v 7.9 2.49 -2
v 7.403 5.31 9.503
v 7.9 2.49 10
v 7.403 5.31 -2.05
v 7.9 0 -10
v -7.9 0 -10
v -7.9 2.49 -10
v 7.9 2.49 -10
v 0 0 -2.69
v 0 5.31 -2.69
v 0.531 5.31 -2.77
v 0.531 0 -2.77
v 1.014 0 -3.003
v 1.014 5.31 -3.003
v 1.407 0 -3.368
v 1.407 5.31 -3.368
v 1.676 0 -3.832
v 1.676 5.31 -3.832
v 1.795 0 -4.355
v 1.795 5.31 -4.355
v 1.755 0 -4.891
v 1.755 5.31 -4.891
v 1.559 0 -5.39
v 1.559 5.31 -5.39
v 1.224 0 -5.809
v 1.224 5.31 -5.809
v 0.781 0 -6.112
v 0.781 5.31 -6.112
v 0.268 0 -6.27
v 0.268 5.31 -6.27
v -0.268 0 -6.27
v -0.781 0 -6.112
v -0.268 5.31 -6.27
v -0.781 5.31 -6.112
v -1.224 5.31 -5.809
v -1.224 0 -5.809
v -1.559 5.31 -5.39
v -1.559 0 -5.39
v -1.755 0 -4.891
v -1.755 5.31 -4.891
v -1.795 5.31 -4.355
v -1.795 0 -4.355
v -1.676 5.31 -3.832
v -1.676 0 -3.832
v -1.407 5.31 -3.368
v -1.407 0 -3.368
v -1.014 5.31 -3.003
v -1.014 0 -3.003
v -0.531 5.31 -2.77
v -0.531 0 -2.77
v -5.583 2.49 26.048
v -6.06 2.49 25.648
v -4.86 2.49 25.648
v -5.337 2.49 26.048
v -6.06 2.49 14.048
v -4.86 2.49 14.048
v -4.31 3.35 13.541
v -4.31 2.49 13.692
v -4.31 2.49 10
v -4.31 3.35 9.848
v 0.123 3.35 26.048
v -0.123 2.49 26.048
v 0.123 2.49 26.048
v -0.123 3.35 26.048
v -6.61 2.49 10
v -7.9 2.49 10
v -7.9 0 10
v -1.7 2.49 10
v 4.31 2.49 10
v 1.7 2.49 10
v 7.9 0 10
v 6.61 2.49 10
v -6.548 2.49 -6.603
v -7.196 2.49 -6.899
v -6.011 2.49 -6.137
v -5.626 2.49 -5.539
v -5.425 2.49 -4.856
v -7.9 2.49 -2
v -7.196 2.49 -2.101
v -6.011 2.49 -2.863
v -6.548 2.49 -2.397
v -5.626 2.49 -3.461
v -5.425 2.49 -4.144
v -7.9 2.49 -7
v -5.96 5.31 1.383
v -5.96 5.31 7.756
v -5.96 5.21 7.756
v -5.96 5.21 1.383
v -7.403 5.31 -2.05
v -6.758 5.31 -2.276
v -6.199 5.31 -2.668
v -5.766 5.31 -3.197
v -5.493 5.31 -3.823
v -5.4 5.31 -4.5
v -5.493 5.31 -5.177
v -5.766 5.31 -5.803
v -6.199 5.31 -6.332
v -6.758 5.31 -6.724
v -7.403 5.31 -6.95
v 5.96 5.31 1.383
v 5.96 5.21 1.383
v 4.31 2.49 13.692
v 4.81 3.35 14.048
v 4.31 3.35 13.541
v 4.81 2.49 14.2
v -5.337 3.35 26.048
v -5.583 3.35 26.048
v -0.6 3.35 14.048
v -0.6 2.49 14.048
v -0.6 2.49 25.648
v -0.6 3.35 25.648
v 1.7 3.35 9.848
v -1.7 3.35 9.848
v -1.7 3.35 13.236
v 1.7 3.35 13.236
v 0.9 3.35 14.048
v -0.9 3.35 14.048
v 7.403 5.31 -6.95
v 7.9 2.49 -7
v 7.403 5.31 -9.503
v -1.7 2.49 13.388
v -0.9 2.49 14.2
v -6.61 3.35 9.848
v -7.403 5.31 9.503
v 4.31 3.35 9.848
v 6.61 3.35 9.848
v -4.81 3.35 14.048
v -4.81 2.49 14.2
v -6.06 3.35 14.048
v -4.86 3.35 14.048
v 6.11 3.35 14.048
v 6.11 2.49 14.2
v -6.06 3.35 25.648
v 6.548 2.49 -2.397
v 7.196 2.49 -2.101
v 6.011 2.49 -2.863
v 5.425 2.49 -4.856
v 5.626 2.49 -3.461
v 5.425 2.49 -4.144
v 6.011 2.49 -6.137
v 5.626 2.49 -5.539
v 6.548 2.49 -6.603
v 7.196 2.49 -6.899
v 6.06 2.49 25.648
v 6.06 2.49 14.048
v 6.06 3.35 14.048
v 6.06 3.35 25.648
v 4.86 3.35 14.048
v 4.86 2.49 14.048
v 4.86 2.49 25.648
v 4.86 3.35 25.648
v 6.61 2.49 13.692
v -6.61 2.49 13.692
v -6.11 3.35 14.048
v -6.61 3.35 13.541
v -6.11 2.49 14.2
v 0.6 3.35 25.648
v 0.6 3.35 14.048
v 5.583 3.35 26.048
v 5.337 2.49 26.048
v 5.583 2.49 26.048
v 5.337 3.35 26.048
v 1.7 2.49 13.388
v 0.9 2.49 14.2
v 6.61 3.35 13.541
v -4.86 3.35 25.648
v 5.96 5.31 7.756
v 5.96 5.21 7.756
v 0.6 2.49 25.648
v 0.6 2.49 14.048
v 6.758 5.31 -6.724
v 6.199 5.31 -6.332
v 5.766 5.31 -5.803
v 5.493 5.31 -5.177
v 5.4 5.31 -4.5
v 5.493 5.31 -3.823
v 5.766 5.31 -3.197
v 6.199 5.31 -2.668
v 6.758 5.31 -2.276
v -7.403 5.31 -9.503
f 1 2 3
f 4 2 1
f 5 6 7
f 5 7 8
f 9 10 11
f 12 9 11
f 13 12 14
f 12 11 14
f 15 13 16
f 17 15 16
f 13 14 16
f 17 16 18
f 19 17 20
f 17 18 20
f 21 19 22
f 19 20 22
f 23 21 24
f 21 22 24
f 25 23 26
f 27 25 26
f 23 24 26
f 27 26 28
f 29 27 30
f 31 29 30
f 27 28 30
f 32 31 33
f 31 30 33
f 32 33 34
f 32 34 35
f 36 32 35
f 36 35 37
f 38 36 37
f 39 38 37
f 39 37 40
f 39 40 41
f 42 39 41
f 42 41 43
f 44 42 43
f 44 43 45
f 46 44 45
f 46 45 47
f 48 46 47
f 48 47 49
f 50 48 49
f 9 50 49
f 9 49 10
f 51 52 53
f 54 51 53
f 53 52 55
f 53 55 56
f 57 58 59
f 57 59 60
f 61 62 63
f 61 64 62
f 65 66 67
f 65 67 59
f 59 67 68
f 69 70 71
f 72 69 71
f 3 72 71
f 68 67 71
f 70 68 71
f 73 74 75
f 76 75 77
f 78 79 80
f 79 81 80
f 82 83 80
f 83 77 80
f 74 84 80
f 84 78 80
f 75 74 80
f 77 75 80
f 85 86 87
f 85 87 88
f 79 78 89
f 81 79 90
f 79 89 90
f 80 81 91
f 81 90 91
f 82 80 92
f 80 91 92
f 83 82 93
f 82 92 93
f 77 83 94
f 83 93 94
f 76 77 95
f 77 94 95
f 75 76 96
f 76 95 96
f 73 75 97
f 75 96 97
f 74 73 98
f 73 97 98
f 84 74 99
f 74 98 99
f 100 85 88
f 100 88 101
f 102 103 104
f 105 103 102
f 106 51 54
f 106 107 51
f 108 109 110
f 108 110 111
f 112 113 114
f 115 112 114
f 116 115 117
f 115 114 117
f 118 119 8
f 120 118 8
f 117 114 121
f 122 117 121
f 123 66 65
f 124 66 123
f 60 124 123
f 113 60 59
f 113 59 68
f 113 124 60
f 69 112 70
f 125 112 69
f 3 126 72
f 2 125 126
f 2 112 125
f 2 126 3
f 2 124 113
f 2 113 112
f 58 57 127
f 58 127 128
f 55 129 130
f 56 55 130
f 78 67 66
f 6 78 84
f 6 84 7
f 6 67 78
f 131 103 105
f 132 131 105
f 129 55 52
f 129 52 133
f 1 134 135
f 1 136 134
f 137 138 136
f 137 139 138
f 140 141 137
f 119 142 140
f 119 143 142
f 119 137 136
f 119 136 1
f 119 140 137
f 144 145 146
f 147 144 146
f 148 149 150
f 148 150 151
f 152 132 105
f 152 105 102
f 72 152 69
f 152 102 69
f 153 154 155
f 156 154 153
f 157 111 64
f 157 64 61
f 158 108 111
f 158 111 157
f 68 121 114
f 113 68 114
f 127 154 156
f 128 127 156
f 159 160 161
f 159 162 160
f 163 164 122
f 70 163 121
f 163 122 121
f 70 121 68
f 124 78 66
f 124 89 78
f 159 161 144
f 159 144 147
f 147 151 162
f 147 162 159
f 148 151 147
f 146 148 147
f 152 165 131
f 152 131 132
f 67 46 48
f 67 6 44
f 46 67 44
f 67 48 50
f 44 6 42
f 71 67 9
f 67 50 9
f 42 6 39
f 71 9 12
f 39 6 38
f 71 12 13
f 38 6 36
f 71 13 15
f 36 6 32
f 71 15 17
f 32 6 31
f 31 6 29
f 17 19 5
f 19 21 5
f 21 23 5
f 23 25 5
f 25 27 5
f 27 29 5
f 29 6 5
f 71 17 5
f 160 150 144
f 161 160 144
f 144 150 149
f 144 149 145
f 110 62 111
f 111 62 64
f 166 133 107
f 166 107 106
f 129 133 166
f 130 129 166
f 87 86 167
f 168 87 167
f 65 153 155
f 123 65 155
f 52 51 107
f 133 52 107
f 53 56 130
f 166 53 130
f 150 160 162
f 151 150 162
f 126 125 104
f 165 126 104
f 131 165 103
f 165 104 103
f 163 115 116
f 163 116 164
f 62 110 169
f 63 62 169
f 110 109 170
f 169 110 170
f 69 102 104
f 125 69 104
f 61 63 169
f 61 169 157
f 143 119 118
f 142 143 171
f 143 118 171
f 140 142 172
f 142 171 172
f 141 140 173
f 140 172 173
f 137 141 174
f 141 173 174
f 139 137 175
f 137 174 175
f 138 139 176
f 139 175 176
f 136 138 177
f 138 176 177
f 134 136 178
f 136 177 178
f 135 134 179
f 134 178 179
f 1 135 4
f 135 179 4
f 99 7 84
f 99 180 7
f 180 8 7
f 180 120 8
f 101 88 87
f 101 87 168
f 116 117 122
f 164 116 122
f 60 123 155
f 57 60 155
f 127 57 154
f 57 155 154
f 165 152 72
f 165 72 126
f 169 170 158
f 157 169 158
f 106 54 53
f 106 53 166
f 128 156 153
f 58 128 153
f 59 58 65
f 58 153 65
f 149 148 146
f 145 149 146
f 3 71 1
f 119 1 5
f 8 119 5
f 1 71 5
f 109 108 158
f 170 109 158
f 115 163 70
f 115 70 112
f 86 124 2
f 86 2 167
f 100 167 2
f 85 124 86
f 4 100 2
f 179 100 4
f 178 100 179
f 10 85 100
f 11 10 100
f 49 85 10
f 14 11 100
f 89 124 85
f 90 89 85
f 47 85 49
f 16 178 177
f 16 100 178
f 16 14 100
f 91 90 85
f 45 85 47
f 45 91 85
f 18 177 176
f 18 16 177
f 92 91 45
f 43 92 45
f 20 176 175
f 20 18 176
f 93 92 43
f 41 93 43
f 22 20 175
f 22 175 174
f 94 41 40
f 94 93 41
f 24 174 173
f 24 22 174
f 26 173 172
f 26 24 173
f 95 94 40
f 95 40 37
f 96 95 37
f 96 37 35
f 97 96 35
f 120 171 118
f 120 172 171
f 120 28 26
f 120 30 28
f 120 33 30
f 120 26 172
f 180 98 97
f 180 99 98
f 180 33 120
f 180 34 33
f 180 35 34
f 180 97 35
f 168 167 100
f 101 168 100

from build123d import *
from OCP.BRepFilletAPI import BRepFilletAPI_MakeChamfer

# Parameters (mm, degrees)
SKETCH1_W             = 15.8
SKETCH1_H             = 20
BOSS_EXTRUDE1_DEPTH   = 2.49
SKETCH2_W             = 15.8
SKETCH2_H             = 20
BOSS_EXTRUDE3_DEPTH   = 2.82
BOSS_EXTRUDE3_TAPER   = 10
BOSS_EXTRUDE4_START   = -1.7
BOSS_EXTRUDE4_DEPTH   = 3.4
BOSS_EXTRUDE4_START_2 = -6.61
BOSS_EXTRUDE4_2_DEPTH = 2.3
BOSS_EXTRUDE4_START_3 = 4.31
BOSS_EXTRUDE4_3_DEPTH = 2.3
BOSS_EXTRUDE6_START   = 14.04836
SKETCH5_W             = 1.2
SKETCH5_H             = 0.86
BOSS_EXTRUDE6_DEPTH   = 12
BOSS_EXTRUDE6_2_DEPTH = 12
BOSS_EXTRUDE6_3_DEPTH = 12
SKETCH6_R             = 1.8
CUT_EXTRUDE1_DEPTH    = 28.733069795
SKETCH7_R             = 2.5
CUT_EXTRUDE2_DEPTH    = 2.82
CHAMFER2_SIZE         = 0.5
CHAMFER3_SIZE         = 0.8
CHAMFER7_SIZE         = 0.4
CHAMFER7_SIZE2        = 0.476701437
CHAMFER8_SIZE         = 0.4
CHAMFER8_SIZE2        = 0.476701437
CHAMFER9_SIZE         = 0.4
CHAMFER9_SIZE2        = 0.476701437
SKETCH9_W             = 12.986336946
SKETCH9_H             = 15.440559179
CUT_EXTRUDE3_DEPTH    = 2.49
SKETCH10_W            = 12.986336946
SKETCH10_H            = 15.440559179
BOSS_EXTRUDE7_DEPTH   = 2.49
SKETCH13_R            = 1.8
CUT_EXTRUDE4_DEPTH    = 2.49
SKETCH14_W            = 11.919281888
SKETCH14_H            = 6.372610916
CUT_EXTRUDE5_DEPTH    = 0.1


# Read off the part's stored shape, not the designer's step: Boss-Extrude4
with BuildPart() as part:
    # Sketch1 → Boss-Extrude1 (new body)
    with BuildSketch(Plane(origin=(0, 0, 0), x_dir=(1, 0, 0), z_dir=(0, 1, 0))):
        Rectangle(SKETCH1_W, SKETCH1_H)
    extrude(amount=BOSS_EXTRUDE1_DEPTH)

    # Sketch2 → Boss-Extrude3 (add)
    with BuildSketch(Plane(origin=(0, 2.49, 0), x_dir=(1, 0, 0), z_dir=(0, 1, 0))):
        Rectangle(SKETCH2_W, SKETCH2_H)
    extrude(amount=BOSS_EXTRUDE3_DEPTH, taper=BOSS_EXTRUDE3_TAPER)

    # Boss-Extrude4 outline → Boss-Extrude4 (add)
    with BuildSketch(Plane.YZ.offset(BOSS_EXTRUDE4_START)):
        Polygon((2.49, 10), (3.35, 9.848358796), (3.35, 14.048358797), (2.49, 14.2), align=None)
    extrude(amount=BOSS_EXTRUDE4_DEPTH)

    # Boss-Extrude4 2 outline → Boss-Extrude4 2 (add)
    with BuildSketch(Plane.YZ.offset(BOSS_EXTRUDE4_START_2)):
        Polygon((2.49, 10), (3.35, 9.848358796), (3.35, 14.048358797), (2.49, 14.2), align=None)
    extrude(amount=BOSS_EXTRUDE4_2_DEPTH)

    # Boss-Extrude4 3 outline → Boss-Extrude4 3 (add)
    with BuildSketch(Plane.YZ.offset(BOSS_EXTRUDE4_START_3)):
        Polygon((2.49, 10), (3.35, 9.848358796), (3.35, 14.048358797), (2.49, 14.2), align=None)
    extrude(amount=BOSS_EXTRUDE4_3_DEPTH)

    # Sketch6 → Cut-Extrude1 (cut, through all)
    with BuildSketch(Plane(origin=(0, 5.31, 0), x_dir=(1, 0, 0), z_dir=(0, 1, 0))):
        with Locations(Location((0, 4.49, 0), (0, 0, 270))):
            Circle(SKETCH6_R)
    extrude(amount=-CUT_EXTRUDE1_DEPTH, mode=Mode.SUBTRACT)

    # Sketch7 → Cut-Extrude2 (cut)
    with BuildSketch(Plane(origin=(0, 5.31, 0), x_dir=(1, 0, 0), z_dir=(0, 1, 0))):
        with Locations((7.9, 4.5)):
            Circle(SKETCH7_R)
        with Locations((-7.9, 4.5)):
            Circle(SKETCH7_R)
    extrude(amount=-CUT_EXTRUDE2_DEPTH, mode=Mode.SUBTRACT)

    # Chamfer2
    chamfer2_edges = [part.edges().sort_by_distance(p)[0] for p in [
        (4.31, 2.92, 14.124179399),
        (6.61, 2.92, 14.124179399),
        (-4.31, 2.92, 14.124179399),
        (-6.61, 2.92, 14.124179399),
    ]]
    chamfer(chamfer2_edges, length=CHAMFER2_SIZE)

    # Chamfer3
    chamfer3_edges = [part.edges().sort_by_distance(p)[0] for p in [
        (1.7, 2.92, 14.124179399),
        (-1.7, 2.92, 14.124179399),
    ]]
    chamfer(chamfer3_edges, length=CHAMFER3_SIZE)

    # Sketch9 → Cut-Extrude3 (cut)
    with BuildSketch(Plane.XZ):
        with Locations((0, -0.672147613)):
            Rectangle(SKETCH9_W, SKETCH9_H)
    extrude(amount=-CUT_EXTRUDE3_DEPTH, mode=Mode.SUBTRACT)

    # Sketch10 → Boss-Extrude7 (add)
    with BuildSketch(Plane.XZ.offset(-2.49)):
        with Locations((0, -0.672147613)):
            Rectangle(SKETCH10_W, SKETCH10_H)
    extrude(amount=BOSS_EXTRUDE7_DEPTH)

    # Sketch13 → Cut-Extrude4 (cut)
    with BuildSketch(Plane(origin=(0, 2.49, 0), x_dir=(1, 0, 0), z_dir=(0, 1, 0))):
        with Locations(Location((0, 4.49, 0), (0, 0, 270))):
            Circle(SKETCH13_R)
    extrude(amount=-CUT_EXTRUDE4_DEPTH, mode=Mode.SUBTRACT)

    # Sketch14 → Cut-Extrude5 (cut)
    with BuildSketch(Plane(origin=(0, 5.31, 0), x_dir=(1, 0, 0), z_dir=(0, 1, 0))):
        with Locations((0, -4.569573217)):
            Rectangle(SKETCH14_W, SKETCH14_H)
    extrude(amount=-CUT_EXTRUDE5_DEPTH, mode=Mode.SUBTRACT)


with BuildPart() as body_2:
    # Sketch5 → Boss-Extrude6 (new body)
    with BuildSketch(Plane.XY.offset(BOSS_EXTRUDE6_START)):
        with Locations((0, 2.92)):
            Rectangle(SKETCH5_W, SKETCH5_H)
    extrude(amount=BOSS_EXTRUDE6_DEPTH)

    # Chamfer7: one chamfer whose edges measure the first distance from different faces: ONE call of the kernel's chamfer builder (chamfer() names one face for all edges)
    chamfer7_edges_1 = [body_2.edges().sort_by_distance(p)[0] for p in [
        (-0.6, 2.92, 26.04836),
    ]]
    chamfer7_side_1 = [body_2.faces().sort_by_distance(p)[0] for p in [
        (-0.6, 2.92, 20.04836),
    ]]
    chamfer7_edges_2 = [body_2.edges().sort_by_distance(p)[0] for p in [
        (0.6, 2.92, 26.04836),
    ]]
    chamfer7_side_2 = [body_2.faces().sort_by_distance(p)[0] for p in [
        (0.6, 2.92, 20.04836),
    ]]
    chamfer7 = BRepFilletAPI_MakeChamfer(body_2.part.solid().wrapped)
    for e in chamfer7_edges_1:
        chamfer7.Add(CHAMFER7_SIZE, CHAMFER7_SIZE2, e.wrapped, chamfer7_side_1[0].wrapped)  # the first distance lies on this face
    for e in chamfer7_edges_2:
        chamfer7.Add(CHAMFER7_SIZE, CHAMFER7_SIZE2, e.wrapped, chamfer7_side_2[0].wrapped)  # the first distance lies on this face
    add(Compound.cast(chamfer7.Shape()), mode=Mode.REPLACE)


with BuildPart() as body_3:
    # Sketch5 → Boss-Extrude6 2 (new body)
    with BuildSketch(Plane.XY.offset(BOSS_EXTRUDE6_START)):
        with Locations((5.46, 2.92)):
            Rectangle(SKETCH5_W, SKETCH5_H)
    extrude(amount=BOSS_EXTRUDE6_2_DEPTH)

    # Chamfer9: one chamfer whose edges measure the first distance from different faces: ONE call of the kernel's chamfer builder (chamfer() names one face for all edges)
    chamfer9_edges_1 = [body_3.edges().sort_by_distance(p)[0] for p in [
        (4.86, 2.92, 26.04836),
    ]]
    chamfer9_side_1 = [body_3.faces().sort_by_distance(p)[0] for p in [
        (4.86, 2.92, 20.04836),
    ]]
    chamfer9_edges_2 = [body_3.edges().sort_by_distance(p)[0] for p in [
        (6.06, 2.92, 26.04836),
    ]]
    chamfer9_side_2 = [body_3.faces().sort_by_distance(p)[0] for p in [
        (6.06, 2.92, 20.04836),
    ]]
    chamfer9 = BRepFilletAPI_MakeChamfer(body_3.part.solid().wrapped)
    for e in chamfer9_edges_1:
        chamfer9.Add(CHAMFER9_SIZE, CHAMFER9_SIZE2, e.wrapped, chamfer9_side_1[0].wrapped)  # the first distance lies on this face
    for e in chamfer9_edges_2:
        chamfer9.Add(CHAMFER9_SIZE, CHAMFER9_SIZE2, e.wrapped, chamfer9_side_2[0].wrapped)  # the first distance lies on this face
    add(Compound.cast(chamfer9.Shape()), mode=Mode.REPLACE)


with BuildPart() as body_4:
    # Sketch5 → Boss-Extrude6 3 (new body)
    with BuildSketch(Plane.XY.offset(BOSS_EXTRUDE6_START)):
        with Locations((-5.46, 2.92)):
            Rectangle(SKETCH5_W, SKETCH5_H)
    extrude(amount=BOSS_EXTRUDE6_3_DEPTH)

    # Chamfer8: one chamfer whose edges measure the first distance from different faces: ONE call of the kernel's chamfer builder (chamfer() names one face for all edges)
    chamfer8_edges_1 = [body_4.edges().sort_by_distance(p)[0] for p in [
        (-4.86, 2.92, 26.04836),
    ]]
    chamfer8_side_1 = [body_4.faces().sort_by_distance(p)[0] for p in [
        (-4.86, 2.92, 20.04836),
    ]]
    chamfer8_edges_2 = [body_4.edges().sort_by_distance(p)[0] for p in [
        (-6.06, 2.92, 26.04836),
    ]]
    chamfer8_side_2 = [body_4.faces().sort_by_distance(p)[0] for p in [
        (-6.06, 2.92, 20.04836),
    ]]
    chamfer8 = BRepFilletAPI_MakeChamfer(body_4.part.solid().wrapped)
    for e in chamfer8_edges_1:
        chamfer8.Add(CHAMFER8_SIZE, CHAMFER8_SIZE2, e.wrapped, chamfer8_side_1[0].wrapped)  # the first distance lies on this face
    for e in chamfer8_edges_2:
        chamfer8.Add(CHAMFER8_SIZE, CHAMFER8_SIZE2, e.wrapped, chamfer8_side_2[0].wrapped)  # the first distance lies on this face
    add(Compound.cast(chamfer8.Shape()), mode=Mode.REPLACE)


solid = Compound([part.part, body_2.part, body_3.part, body_4.part])
